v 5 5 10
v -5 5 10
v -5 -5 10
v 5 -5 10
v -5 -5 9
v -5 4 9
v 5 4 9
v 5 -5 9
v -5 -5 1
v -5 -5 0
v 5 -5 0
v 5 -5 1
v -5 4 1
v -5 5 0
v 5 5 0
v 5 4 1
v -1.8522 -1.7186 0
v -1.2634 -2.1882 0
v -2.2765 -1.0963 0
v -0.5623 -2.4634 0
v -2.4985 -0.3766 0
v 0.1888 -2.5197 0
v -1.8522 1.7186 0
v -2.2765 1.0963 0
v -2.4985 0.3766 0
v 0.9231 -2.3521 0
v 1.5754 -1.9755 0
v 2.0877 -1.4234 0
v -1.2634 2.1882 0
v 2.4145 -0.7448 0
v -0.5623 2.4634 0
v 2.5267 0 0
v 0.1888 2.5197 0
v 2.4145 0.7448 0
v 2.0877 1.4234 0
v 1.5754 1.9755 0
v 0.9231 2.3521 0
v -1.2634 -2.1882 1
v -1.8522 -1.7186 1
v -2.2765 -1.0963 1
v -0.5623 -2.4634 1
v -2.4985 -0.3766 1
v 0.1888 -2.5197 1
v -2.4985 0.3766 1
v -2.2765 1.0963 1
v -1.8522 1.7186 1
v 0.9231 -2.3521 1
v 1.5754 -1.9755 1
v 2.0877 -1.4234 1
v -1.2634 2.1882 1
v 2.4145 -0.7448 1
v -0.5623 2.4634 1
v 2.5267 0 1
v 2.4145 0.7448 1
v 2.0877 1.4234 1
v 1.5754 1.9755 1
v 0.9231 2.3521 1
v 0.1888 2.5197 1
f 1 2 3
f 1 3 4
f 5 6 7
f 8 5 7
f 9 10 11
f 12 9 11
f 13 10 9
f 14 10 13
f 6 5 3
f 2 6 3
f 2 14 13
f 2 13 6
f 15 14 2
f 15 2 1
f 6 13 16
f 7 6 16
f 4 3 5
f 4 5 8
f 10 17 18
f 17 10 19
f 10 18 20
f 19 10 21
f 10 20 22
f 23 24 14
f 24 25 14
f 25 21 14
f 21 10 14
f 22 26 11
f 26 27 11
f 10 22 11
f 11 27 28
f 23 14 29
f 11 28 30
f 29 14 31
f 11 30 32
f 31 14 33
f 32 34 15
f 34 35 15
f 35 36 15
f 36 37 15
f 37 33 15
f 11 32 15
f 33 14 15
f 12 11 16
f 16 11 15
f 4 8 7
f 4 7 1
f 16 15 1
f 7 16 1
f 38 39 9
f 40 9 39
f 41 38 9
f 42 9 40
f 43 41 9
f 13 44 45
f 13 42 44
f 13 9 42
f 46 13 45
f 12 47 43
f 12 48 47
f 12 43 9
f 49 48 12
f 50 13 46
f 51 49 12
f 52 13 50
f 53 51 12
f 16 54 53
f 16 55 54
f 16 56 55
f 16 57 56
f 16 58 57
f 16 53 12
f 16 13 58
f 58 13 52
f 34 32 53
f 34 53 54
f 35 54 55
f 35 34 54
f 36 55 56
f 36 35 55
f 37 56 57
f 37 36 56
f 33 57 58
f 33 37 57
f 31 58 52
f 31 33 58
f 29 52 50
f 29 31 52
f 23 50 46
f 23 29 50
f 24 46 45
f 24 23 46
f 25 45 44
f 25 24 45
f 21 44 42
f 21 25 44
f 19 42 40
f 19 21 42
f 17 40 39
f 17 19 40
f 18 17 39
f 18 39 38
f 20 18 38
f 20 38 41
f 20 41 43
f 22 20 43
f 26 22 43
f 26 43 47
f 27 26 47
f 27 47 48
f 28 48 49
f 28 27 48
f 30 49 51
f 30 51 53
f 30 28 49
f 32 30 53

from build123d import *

# Parameters (mm, degrees)
F0_W     = 10
F0_H     = 10
F0_R     = 2.526739
F1_DEPTH = 1
F2_W     = 10
F2_H     = 1
F3_DEPTH = 9
F4_W     = 10
F4_H     = 1
F5_DEPTH = 9


with BuildPart() as f1:
    # F0 (on Top) → F1 (new body)
    with BuildSketch(Plane.XY):
        Rectangle(F0_W, F0_H)
        Circle(F0_R, mode=Mode.SUBTRACT)
    extrude(amount=F1_DEPTH)

    # F2 (on face) → F3 (join)
    with BuildSketch(Plane.XY.offset(1)):
        with Locations((0, 4.5)):
            Rectangle(F2_W, F2_H)
    extrude(amount=F3_DEPTH)

    # F4 (on face) → F5 (join)
    with BuildSketch(Plane.XZ.offset(-4)):
        with Locations((0, 9.5)):
            Rectangle(F4_W, F4_H)
    extrude(amount=F5_DEPTH)


solid = f1.part
